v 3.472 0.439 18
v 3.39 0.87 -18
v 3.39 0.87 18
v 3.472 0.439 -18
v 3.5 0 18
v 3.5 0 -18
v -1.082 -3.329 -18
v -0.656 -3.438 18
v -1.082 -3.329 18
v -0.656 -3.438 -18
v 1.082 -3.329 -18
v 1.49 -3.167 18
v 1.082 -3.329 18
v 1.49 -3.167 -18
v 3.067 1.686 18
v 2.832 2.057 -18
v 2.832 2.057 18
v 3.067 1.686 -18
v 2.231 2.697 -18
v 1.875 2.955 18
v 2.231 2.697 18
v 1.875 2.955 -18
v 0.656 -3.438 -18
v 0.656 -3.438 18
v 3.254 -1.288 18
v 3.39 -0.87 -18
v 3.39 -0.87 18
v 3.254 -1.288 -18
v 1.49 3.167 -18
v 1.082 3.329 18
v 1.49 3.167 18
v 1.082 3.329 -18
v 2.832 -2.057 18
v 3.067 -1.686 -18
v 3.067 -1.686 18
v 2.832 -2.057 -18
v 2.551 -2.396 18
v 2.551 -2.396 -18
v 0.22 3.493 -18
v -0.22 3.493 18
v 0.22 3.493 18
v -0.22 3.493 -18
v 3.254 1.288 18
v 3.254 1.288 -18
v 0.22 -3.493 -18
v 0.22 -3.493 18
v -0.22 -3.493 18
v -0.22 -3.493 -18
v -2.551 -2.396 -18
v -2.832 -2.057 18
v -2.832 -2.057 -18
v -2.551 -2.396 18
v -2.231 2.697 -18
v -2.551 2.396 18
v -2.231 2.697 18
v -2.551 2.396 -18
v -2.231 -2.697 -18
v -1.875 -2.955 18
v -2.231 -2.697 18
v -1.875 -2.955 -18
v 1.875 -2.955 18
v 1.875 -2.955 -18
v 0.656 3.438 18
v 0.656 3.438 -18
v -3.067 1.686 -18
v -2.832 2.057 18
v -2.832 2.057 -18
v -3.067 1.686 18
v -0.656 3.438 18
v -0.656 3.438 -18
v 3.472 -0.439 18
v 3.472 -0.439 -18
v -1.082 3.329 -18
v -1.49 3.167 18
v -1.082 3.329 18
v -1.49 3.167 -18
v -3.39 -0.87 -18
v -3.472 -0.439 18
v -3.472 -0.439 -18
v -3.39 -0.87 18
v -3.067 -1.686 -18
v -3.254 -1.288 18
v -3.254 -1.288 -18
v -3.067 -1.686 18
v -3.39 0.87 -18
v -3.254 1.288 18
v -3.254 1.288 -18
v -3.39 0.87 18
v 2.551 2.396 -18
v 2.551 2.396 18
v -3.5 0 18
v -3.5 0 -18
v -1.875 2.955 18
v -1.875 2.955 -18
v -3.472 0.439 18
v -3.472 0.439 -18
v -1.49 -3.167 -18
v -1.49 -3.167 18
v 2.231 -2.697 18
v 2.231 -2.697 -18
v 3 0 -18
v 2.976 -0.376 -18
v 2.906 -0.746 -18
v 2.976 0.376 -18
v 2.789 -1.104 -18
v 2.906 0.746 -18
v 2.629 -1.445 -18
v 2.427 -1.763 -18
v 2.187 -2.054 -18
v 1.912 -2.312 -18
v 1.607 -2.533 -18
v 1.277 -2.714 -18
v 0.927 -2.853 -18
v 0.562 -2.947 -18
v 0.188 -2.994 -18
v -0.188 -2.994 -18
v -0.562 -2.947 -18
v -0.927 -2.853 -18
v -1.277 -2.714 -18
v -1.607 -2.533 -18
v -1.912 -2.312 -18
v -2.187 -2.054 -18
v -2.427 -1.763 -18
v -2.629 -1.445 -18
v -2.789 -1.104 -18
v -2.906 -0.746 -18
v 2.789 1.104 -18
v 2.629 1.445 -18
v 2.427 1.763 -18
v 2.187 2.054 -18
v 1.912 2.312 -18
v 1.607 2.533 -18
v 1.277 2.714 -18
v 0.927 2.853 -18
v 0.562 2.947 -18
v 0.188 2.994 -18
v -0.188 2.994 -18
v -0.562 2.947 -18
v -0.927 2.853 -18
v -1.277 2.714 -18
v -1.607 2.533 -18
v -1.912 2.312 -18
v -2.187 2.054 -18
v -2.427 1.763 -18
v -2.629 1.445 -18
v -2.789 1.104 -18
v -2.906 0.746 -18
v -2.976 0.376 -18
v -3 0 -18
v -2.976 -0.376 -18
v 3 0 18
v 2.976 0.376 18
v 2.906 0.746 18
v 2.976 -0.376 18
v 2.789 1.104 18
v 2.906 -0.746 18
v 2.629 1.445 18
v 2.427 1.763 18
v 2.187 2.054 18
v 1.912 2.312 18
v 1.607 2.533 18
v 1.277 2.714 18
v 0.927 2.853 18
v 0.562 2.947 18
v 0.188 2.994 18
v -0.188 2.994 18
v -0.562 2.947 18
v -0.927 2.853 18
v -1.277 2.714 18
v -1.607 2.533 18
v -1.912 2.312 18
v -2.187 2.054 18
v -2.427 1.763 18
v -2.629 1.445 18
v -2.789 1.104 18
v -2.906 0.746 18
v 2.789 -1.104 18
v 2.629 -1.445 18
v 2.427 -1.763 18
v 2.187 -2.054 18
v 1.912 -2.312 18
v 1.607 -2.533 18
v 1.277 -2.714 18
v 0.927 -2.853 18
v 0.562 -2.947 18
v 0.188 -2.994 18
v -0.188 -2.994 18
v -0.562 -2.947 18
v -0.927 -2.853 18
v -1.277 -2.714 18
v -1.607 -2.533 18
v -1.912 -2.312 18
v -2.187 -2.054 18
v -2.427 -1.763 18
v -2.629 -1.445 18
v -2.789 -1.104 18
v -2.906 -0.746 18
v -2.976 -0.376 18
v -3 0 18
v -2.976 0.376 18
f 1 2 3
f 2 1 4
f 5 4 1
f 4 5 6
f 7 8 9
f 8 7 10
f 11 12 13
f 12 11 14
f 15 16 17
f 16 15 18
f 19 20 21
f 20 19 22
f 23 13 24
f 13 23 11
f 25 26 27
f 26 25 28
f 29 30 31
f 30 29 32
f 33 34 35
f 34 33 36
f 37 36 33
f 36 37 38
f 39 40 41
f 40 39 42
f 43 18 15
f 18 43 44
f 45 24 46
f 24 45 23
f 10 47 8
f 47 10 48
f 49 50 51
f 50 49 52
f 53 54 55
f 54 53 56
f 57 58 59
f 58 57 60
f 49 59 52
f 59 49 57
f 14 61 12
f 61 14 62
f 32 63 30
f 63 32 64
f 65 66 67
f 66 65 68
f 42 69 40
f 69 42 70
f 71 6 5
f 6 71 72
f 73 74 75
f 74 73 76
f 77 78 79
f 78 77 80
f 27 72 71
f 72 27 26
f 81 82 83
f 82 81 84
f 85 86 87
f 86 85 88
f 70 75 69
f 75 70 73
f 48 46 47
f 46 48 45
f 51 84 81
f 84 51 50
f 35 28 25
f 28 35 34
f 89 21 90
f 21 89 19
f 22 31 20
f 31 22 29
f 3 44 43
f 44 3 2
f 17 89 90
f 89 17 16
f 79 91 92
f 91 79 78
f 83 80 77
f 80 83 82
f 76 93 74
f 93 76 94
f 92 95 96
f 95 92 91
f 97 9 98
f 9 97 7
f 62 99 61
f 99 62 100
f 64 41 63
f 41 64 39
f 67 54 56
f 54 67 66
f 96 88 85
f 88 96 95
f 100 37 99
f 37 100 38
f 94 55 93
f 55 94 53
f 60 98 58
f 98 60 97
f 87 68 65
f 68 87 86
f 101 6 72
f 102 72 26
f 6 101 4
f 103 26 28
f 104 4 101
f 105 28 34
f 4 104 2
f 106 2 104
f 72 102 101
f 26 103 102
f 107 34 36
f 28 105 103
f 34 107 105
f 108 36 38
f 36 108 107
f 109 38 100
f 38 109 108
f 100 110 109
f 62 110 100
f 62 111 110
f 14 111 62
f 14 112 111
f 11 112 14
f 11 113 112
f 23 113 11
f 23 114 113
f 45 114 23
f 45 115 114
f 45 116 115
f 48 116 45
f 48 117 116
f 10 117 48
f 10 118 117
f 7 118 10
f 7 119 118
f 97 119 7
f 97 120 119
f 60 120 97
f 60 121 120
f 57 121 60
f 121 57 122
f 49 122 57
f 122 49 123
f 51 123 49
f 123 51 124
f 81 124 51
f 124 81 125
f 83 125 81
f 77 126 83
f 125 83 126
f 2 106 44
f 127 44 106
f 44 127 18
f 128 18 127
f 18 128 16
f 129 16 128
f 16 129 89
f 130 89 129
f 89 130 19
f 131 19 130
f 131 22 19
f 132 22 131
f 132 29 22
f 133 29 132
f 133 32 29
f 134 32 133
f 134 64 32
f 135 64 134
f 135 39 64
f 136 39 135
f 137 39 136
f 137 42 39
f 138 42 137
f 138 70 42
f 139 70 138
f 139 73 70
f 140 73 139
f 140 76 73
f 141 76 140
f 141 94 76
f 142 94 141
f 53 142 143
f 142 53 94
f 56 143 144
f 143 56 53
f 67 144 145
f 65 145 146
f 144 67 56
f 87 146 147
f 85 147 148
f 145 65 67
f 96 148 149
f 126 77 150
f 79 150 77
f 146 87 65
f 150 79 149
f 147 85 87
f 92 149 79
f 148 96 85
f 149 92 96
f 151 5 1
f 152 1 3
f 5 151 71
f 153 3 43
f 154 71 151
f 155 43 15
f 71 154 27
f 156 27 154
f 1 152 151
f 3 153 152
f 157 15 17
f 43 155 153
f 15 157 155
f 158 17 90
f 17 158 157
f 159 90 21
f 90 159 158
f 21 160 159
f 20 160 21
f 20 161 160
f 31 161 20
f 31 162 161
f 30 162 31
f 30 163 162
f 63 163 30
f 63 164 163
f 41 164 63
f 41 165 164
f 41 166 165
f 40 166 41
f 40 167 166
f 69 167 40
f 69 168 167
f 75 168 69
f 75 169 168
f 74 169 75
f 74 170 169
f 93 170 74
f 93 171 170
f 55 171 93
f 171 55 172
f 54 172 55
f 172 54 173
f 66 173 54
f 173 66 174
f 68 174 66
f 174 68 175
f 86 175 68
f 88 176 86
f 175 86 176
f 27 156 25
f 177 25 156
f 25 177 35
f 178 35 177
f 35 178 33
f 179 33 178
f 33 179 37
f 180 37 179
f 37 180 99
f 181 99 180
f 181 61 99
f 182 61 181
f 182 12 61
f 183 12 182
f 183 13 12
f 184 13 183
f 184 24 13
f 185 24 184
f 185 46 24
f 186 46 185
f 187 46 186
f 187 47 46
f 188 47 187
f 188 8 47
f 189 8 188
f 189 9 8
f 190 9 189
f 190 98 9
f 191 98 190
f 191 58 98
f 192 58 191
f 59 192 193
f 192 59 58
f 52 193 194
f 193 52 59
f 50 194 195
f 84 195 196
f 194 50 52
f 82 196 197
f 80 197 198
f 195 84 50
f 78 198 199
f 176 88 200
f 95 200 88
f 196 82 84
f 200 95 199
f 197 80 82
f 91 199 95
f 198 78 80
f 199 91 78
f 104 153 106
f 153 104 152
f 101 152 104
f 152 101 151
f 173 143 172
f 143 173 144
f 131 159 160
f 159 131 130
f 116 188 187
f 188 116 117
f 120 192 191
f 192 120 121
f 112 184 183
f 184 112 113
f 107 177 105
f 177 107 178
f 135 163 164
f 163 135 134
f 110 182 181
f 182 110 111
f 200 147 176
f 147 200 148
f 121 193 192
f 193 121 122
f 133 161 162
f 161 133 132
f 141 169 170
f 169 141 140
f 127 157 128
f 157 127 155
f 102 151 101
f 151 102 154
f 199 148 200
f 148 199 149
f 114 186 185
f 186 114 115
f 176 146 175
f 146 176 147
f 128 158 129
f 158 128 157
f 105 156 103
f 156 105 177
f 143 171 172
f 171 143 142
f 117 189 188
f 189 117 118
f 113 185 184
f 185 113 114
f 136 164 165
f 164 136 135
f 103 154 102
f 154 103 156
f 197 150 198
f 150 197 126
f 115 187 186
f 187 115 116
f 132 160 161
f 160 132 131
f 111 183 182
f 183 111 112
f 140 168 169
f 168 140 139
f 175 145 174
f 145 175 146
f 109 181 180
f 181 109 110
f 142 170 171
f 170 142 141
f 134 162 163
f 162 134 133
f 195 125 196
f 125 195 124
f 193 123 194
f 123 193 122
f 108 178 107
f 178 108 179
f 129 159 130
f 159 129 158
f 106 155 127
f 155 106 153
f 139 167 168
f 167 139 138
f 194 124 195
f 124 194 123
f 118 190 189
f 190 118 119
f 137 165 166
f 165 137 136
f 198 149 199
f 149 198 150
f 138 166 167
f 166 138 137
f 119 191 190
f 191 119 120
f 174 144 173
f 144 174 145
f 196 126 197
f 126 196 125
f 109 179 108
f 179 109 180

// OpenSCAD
$fn = 50;


difference() {
	union() {
		translate(v = [0, 0, -18.0000000000]) {
			cylinder(h = 36, r = 3.5000000000);
		}
	}
	union() {
		translate(v = [0, 0, -100.0000000000]) {
			cylinder(h = 200, r = 3.0000000000);
		}
	}
}
